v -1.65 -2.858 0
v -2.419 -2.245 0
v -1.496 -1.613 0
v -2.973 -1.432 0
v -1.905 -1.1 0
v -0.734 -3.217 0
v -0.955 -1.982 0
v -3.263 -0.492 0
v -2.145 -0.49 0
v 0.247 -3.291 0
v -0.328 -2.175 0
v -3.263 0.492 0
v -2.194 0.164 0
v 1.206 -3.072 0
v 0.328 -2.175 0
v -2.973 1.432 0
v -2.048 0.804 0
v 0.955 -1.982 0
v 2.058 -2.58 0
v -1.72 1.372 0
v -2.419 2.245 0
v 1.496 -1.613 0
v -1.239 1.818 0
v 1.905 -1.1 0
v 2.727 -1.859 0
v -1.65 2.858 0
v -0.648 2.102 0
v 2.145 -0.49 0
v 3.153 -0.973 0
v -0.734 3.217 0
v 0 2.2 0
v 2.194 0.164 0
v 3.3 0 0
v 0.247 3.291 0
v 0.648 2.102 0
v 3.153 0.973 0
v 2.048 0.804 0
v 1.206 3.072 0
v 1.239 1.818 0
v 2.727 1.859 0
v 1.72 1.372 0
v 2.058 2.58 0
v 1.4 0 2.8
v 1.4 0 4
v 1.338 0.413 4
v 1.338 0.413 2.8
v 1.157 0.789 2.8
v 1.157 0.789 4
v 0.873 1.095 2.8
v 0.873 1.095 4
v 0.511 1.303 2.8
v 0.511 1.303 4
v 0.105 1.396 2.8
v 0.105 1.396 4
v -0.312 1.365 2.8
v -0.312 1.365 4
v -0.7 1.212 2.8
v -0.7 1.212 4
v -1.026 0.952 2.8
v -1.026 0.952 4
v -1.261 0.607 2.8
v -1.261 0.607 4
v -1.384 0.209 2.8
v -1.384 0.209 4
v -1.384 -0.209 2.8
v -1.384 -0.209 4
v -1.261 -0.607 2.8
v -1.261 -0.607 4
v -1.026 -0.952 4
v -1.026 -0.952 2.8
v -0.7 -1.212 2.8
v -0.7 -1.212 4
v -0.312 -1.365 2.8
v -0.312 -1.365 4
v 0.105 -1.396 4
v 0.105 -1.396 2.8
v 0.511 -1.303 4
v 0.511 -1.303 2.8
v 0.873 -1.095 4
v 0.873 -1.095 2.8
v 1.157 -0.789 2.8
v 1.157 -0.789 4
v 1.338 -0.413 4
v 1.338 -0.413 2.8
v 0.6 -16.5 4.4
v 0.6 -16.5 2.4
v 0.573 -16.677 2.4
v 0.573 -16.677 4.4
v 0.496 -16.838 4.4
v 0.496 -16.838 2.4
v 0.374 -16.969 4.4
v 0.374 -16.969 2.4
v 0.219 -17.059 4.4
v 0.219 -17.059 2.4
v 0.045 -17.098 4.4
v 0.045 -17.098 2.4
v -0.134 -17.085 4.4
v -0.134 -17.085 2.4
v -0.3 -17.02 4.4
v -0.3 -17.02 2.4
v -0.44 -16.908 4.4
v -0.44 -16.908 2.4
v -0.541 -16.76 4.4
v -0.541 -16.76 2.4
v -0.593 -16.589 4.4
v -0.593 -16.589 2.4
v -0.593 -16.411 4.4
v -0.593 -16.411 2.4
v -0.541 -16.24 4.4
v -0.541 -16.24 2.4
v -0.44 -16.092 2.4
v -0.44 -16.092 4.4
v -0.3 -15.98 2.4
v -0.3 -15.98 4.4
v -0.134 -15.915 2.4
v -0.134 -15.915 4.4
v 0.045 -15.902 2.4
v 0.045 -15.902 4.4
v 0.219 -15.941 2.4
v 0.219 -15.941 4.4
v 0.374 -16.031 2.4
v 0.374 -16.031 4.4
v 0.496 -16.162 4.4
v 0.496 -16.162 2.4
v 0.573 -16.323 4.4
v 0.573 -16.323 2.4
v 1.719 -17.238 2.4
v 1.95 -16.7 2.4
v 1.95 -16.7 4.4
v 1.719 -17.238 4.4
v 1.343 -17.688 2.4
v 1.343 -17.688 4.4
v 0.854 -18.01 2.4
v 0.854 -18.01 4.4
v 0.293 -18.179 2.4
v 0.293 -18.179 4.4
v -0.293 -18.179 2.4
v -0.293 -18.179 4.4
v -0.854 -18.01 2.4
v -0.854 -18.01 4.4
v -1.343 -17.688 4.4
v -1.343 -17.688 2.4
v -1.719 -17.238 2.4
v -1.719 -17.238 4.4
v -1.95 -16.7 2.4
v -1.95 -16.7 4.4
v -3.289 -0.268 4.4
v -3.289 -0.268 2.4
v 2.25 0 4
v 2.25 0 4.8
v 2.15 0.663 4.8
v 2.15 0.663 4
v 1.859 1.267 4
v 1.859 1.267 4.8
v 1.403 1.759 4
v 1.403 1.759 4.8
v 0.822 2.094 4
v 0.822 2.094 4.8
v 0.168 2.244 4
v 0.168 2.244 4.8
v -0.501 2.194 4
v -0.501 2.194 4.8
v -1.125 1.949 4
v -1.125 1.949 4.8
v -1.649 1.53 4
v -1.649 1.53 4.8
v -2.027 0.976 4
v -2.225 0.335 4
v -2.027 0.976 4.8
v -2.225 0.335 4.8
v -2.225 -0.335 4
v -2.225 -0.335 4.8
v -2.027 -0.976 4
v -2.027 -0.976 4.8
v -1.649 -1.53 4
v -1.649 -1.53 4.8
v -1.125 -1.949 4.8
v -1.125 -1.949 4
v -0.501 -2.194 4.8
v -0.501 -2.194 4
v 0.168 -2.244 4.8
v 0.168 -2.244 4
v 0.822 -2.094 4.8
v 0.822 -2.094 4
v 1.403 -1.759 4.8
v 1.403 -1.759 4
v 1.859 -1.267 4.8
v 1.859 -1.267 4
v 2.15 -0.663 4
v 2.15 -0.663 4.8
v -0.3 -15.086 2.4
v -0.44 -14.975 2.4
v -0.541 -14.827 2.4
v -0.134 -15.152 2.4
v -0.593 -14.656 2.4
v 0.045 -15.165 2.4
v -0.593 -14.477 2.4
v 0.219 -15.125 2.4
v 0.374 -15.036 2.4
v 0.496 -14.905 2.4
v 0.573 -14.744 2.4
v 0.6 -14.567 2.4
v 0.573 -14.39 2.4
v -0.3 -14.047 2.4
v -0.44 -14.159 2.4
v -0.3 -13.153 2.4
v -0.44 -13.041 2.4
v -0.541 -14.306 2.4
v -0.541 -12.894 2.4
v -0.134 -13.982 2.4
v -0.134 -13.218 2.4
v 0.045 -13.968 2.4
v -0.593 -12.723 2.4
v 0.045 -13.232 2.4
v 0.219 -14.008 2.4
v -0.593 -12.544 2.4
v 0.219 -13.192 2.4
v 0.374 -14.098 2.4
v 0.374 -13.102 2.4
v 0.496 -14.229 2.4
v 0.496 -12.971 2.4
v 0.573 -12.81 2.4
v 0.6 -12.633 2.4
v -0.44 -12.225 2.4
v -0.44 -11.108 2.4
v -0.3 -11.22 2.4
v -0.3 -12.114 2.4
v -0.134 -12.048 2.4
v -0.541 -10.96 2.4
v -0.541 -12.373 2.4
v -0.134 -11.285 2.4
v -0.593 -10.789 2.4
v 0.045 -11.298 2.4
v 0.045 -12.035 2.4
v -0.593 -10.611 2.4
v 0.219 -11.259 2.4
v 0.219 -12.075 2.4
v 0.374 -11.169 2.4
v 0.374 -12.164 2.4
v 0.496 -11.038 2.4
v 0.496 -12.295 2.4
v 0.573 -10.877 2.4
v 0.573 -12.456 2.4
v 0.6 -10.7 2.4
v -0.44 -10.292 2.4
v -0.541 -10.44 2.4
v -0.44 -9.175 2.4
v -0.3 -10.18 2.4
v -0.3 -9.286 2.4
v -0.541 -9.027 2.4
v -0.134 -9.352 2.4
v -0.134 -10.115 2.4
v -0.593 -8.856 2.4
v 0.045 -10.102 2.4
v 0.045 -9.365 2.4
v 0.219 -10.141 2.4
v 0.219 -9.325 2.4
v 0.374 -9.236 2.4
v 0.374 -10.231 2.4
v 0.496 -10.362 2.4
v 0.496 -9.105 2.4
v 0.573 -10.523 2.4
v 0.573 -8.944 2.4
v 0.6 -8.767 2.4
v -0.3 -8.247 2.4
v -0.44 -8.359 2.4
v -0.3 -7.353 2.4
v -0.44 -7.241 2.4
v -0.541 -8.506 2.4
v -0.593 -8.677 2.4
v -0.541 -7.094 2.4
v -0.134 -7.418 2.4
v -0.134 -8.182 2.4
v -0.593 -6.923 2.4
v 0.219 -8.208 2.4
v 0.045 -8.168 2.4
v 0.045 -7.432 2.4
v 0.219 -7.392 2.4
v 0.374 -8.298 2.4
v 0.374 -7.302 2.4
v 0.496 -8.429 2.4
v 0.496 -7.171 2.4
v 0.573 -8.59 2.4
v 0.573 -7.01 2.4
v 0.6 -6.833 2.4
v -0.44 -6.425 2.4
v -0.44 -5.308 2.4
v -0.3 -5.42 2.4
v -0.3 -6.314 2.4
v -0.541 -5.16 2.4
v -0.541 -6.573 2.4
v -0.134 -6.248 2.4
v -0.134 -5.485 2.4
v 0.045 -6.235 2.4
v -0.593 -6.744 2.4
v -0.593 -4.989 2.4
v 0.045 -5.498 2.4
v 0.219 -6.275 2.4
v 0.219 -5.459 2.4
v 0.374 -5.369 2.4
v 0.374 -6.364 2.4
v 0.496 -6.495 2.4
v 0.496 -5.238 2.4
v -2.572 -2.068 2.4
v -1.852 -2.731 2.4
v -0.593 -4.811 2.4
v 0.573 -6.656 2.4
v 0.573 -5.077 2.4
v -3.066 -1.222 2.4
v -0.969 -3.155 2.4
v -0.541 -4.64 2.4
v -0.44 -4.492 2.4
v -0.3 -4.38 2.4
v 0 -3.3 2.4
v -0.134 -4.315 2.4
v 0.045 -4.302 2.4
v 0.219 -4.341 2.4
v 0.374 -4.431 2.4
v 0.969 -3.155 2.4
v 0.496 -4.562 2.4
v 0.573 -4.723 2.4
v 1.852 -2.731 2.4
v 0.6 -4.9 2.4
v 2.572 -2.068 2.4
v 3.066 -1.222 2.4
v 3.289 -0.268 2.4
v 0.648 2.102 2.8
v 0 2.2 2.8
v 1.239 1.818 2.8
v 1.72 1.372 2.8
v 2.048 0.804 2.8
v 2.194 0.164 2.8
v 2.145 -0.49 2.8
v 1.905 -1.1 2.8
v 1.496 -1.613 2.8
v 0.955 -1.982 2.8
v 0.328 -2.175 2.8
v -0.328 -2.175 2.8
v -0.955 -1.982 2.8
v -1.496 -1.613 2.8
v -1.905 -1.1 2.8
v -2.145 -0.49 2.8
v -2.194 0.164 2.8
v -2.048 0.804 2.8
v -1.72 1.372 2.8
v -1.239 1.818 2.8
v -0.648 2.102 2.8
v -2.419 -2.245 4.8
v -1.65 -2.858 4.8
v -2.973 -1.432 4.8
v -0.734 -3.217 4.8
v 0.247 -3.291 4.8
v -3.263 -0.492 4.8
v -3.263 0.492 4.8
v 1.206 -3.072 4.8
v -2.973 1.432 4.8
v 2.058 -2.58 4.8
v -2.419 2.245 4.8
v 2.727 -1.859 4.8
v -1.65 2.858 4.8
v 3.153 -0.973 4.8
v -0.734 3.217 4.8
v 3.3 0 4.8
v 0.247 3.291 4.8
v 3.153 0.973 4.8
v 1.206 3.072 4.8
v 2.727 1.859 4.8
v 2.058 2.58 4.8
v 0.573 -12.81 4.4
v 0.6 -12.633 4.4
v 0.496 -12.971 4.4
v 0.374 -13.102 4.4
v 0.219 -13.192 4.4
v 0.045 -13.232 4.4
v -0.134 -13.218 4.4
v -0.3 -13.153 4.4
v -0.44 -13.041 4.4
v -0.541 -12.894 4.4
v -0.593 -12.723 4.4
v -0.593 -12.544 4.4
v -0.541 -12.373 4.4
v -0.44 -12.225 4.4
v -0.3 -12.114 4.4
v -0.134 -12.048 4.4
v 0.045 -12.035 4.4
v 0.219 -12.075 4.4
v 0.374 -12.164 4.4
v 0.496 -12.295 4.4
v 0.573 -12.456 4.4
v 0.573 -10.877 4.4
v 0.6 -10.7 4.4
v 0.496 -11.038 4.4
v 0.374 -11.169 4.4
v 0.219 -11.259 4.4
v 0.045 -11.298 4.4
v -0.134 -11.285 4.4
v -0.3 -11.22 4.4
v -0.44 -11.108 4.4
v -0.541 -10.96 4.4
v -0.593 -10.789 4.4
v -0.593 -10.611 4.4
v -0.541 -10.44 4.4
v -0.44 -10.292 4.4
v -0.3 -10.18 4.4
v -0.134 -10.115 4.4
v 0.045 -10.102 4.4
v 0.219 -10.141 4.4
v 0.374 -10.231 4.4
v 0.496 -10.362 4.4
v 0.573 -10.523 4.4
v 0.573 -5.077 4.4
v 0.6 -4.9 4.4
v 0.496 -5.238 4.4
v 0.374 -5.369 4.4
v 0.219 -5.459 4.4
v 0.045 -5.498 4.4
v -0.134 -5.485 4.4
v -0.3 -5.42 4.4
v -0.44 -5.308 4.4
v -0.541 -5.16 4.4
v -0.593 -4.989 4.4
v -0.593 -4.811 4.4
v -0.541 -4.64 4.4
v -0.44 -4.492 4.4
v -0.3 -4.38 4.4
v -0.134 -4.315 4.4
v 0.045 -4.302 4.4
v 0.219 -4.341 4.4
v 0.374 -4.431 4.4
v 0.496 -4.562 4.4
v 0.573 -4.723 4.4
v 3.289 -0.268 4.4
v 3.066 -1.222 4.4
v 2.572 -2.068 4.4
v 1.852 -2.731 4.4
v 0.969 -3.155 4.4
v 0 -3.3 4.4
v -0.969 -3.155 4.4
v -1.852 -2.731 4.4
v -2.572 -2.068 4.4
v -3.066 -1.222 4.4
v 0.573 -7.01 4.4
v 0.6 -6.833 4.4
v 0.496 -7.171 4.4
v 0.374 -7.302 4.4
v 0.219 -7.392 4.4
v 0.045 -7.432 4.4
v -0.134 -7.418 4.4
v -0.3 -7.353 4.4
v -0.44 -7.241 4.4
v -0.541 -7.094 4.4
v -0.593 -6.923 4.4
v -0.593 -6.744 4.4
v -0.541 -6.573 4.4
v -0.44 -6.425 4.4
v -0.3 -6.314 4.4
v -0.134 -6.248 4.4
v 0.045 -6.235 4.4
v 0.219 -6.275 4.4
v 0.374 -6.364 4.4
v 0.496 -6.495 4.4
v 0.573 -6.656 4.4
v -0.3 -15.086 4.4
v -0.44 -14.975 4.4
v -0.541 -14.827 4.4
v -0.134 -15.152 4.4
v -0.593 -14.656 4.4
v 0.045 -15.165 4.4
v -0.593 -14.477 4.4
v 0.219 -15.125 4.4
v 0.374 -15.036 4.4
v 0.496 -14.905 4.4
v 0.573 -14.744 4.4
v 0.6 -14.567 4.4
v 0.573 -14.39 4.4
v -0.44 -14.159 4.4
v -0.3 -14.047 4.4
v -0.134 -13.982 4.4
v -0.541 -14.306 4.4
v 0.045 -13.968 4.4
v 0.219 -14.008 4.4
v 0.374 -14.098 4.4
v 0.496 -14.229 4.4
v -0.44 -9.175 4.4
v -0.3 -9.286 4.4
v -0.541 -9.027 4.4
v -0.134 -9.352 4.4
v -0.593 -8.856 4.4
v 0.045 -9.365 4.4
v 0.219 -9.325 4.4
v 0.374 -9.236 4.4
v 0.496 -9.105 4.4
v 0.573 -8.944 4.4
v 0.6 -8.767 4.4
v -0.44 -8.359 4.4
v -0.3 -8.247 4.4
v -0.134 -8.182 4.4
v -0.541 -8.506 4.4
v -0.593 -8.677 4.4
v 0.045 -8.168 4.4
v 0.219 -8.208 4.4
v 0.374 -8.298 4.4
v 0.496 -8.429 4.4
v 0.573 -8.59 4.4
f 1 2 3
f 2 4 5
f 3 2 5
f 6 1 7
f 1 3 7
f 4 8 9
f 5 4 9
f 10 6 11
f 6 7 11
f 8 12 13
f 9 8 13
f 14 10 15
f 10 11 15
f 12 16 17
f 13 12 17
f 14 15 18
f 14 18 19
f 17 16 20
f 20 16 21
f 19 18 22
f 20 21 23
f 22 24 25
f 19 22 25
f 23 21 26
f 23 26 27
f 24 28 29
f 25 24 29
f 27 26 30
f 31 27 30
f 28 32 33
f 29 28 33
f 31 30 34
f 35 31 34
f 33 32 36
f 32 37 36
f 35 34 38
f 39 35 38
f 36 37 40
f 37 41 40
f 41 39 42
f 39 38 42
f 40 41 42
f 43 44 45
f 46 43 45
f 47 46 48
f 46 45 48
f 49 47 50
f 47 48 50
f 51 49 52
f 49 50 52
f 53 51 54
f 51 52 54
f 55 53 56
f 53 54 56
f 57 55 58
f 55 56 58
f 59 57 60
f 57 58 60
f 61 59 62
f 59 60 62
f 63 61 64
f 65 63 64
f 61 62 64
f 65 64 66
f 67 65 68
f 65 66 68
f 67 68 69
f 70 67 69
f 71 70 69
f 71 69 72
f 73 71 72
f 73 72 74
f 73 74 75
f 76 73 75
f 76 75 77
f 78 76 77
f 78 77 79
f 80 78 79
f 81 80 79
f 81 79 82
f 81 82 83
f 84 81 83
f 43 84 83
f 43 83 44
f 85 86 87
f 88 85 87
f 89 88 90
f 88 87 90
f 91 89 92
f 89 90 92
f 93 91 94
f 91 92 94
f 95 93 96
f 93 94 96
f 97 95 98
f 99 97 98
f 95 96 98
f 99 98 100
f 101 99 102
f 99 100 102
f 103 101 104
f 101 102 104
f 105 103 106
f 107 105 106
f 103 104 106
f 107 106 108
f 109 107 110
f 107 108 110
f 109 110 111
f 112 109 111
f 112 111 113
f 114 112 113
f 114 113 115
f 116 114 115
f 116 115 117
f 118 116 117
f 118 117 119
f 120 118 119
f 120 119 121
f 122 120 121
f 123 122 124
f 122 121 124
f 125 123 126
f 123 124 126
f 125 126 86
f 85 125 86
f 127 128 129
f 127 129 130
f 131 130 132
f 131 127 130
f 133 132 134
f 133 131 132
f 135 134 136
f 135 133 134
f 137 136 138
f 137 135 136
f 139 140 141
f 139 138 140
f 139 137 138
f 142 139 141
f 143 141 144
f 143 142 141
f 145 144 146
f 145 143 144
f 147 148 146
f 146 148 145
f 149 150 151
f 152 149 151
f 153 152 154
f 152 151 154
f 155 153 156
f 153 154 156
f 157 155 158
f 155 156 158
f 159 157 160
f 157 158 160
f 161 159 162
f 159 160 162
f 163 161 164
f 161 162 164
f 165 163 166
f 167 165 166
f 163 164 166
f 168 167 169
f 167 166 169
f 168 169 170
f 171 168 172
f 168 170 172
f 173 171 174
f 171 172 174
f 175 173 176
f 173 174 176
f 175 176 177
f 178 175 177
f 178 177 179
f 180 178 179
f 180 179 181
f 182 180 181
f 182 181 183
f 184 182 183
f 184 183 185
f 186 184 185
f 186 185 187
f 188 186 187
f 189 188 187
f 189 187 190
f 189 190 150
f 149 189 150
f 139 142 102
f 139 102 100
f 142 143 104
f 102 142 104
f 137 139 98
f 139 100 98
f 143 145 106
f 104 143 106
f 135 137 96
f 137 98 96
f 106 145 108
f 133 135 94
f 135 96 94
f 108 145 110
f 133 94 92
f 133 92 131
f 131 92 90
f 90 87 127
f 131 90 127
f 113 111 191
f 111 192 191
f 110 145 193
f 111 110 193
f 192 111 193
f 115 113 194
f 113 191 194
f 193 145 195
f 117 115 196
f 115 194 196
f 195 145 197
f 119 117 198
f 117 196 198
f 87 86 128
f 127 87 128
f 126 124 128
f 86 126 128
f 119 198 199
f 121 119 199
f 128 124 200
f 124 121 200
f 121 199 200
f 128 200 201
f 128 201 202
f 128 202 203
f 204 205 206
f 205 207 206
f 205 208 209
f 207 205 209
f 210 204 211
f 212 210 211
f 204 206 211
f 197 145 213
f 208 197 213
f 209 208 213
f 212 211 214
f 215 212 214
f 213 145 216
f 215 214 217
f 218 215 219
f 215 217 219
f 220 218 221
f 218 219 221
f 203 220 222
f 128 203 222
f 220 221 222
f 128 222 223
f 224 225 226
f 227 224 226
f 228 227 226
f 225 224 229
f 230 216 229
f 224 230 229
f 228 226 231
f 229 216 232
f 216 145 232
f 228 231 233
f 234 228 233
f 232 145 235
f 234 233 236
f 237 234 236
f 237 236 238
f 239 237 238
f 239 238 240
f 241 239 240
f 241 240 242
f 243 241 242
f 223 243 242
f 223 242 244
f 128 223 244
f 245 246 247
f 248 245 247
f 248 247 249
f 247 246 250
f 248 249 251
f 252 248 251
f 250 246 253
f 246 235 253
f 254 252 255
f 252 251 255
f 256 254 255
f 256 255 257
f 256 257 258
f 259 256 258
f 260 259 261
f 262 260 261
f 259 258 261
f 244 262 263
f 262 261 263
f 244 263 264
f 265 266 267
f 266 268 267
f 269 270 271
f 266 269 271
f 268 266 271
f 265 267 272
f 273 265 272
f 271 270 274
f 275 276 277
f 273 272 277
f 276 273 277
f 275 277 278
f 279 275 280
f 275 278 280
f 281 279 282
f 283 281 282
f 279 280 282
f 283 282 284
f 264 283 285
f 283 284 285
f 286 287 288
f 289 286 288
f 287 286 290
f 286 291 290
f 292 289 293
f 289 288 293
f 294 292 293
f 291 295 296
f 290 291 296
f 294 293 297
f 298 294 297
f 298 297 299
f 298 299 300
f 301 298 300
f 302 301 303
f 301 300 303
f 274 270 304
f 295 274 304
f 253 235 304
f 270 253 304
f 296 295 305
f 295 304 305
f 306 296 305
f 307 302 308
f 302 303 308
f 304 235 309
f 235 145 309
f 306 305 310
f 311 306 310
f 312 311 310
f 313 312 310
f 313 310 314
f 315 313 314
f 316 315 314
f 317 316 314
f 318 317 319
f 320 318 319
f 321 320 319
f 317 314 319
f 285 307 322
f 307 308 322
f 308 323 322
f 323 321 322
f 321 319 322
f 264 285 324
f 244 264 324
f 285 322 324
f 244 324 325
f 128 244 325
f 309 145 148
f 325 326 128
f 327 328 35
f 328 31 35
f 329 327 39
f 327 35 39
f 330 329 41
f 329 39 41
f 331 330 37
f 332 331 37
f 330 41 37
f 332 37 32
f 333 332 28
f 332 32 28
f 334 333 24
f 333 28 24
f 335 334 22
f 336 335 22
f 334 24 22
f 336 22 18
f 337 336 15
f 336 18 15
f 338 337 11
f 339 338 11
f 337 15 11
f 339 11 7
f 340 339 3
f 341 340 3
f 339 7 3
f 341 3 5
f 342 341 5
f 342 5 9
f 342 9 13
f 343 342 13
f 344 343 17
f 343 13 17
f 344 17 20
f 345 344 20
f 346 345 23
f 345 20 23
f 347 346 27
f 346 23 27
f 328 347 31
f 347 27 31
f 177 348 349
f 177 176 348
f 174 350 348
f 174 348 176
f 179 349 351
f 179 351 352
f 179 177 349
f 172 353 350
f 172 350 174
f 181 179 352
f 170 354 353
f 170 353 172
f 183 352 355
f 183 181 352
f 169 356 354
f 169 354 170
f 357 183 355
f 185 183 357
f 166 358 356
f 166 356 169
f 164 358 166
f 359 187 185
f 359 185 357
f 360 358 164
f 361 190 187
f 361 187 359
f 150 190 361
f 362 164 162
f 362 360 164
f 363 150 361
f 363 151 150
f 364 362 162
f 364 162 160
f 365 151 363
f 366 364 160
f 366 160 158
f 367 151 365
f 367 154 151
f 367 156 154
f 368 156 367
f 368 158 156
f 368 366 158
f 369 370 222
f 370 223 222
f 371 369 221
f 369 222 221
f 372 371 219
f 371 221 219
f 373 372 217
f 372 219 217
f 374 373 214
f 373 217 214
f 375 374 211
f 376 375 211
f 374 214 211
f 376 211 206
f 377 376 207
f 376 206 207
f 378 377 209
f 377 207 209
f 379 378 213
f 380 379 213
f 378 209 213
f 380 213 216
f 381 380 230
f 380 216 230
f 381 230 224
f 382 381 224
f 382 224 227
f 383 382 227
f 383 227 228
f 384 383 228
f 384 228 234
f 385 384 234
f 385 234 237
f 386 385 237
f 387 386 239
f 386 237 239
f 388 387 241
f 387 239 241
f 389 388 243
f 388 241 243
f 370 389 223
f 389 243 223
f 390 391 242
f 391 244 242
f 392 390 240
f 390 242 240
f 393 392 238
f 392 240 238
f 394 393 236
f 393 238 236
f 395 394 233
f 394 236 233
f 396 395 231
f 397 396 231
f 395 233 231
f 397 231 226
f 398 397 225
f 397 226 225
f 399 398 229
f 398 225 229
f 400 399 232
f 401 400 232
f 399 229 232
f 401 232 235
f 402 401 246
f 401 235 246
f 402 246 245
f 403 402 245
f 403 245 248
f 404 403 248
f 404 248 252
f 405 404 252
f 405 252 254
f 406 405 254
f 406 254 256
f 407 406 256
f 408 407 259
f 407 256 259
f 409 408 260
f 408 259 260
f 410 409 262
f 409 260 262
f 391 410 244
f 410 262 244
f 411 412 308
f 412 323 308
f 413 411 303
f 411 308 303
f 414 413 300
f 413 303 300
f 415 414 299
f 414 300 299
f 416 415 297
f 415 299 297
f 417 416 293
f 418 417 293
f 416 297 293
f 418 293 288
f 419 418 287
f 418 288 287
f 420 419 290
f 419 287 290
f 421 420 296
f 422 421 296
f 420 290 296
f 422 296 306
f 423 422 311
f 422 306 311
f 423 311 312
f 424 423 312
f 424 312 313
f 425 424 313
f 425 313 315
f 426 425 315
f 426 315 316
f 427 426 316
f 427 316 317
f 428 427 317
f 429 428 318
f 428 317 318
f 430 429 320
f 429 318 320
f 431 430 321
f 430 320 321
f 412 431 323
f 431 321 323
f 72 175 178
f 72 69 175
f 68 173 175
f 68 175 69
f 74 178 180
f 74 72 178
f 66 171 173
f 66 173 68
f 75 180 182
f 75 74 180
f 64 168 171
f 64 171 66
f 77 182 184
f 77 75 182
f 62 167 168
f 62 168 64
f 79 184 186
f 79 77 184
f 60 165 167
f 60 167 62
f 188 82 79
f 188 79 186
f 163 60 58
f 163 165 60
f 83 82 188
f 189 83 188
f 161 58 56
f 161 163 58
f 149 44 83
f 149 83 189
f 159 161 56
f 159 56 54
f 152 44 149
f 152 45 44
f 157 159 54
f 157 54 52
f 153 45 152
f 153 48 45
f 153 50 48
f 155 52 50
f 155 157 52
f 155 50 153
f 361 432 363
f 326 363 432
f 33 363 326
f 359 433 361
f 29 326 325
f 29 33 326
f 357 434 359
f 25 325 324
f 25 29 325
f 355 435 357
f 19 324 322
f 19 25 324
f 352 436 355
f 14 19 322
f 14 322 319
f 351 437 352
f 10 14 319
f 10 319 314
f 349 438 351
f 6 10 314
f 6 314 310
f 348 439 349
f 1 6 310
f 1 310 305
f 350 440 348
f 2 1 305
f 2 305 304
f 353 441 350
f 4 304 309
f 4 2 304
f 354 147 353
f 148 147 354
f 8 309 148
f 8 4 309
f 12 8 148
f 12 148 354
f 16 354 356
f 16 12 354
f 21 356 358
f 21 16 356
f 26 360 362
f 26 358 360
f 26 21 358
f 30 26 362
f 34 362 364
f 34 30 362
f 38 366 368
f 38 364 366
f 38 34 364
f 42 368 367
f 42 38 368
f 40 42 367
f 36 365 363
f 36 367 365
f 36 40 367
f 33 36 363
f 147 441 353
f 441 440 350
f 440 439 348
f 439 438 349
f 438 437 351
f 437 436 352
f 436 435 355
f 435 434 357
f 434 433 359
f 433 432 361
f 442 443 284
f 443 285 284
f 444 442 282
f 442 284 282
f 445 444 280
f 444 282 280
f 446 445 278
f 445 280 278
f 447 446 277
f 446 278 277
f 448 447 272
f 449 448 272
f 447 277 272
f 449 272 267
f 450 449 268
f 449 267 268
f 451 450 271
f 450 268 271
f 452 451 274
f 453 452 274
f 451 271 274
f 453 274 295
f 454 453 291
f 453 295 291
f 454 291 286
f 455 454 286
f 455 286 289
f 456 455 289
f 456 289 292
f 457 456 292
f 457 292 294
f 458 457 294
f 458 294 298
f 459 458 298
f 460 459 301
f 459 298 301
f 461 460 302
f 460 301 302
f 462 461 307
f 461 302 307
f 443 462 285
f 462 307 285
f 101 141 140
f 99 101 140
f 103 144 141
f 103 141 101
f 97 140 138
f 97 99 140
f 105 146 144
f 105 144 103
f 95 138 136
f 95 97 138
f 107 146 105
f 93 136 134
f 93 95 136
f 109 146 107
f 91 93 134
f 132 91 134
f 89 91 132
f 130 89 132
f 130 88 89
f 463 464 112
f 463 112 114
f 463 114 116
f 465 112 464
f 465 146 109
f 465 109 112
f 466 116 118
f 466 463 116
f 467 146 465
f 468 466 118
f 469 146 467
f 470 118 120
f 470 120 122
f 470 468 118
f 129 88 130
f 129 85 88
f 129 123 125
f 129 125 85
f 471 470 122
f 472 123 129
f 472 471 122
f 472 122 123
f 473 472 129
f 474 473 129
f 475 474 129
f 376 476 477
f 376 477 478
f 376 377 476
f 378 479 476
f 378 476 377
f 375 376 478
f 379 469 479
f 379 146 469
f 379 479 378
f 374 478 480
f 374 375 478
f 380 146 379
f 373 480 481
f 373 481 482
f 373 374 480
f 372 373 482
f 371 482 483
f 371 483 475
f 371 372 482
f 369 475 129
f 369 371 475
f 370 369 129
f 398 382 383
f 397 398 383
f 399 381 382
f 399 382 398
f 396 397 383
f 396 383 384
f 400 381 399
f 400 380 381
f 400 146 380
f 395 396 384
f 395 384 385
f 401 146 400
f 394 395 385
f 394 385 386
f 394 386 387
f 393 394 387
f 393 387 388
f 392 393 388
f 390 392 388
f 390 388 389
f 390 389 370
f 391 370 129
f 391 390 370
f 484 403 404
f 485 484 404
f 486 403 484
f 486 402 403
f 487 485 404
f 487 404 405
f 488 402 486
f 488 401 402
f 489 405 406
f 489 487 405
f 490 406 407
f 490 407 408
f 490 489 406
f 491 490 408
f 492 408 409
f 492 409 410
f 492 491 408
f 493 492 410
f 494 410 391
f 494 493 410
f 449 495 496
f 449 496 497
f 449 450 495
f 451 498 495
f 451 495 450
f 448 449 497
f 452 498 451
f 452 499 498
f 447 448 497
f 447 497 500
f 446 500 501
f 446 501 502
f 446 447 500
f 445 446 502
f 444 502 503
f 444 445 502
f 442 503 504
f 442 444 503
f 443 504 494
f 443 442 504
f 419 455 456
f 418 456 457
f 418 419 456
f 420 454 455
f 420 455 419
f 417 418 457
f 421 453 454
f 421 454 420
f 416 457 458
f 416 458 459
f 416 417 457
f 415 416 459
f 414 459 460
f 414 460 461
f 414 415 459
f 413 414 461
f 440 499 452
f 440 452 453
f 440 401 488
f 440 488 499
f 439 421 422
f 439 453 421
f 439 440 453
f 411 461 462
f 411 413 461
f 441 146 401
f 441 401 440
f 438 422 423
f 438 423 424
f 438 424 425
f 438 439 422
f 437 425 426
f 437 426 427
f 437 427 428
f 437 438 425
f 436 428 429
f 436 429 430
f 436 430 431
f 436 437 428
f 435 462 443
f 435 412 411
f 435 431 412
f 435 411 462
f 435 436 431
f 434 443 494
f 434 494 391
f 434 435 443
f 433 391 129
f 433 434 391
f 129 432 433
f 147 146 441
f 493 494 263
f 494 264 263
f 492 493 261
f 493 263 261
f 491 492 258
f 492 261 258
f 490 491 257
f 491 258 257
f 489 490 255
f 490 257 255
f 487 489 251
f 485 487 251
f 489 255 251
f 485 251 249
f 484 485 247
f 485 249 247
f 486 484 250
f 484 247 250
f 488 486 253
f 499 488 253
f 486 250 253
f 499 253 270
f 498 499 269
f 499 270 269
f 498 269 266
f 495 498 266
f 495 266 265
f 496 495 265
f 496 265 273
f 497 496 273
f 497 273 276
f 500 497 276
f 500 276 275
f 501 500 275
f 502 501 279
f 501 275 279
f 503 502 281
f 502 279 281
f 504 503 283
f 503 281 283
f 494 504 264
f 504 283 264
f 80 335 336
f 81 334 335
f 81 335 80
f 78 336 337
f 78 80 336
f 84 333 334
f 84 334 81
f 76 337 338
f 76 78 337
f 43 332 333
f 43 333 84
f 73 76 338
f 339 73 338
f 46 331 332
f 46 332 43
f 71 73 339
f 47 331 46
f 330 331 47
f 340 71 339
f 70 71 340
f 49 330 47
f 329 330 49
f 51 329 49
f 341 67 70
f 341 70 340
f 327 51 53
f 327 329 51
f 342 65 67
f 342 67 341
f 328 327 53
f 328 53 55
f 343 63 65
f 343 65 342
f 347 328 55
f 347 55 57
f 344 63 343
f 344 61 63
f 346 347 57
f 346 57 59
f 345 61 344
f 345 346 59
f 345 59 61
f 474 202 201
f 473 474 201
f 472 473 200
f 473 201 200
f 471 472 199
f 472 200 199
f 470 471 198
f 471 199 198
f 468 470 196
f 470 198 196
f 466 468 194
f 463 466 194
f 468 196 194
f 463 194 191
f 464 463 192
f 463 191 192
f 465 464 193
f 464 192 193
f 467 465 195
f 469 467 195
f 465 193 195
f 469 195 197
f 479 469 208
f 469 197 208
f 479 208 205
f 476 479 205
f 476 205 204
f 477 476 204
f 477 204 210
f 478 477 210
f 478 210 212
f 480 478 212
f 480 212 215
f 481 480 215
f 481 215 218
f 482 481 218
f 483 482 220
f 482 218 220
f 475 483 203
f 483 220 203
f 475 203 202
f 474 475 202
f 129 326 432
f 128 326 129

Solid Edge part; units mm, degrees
sketch "Sketch1" plane through (0, 0, 0) normal (0, 0, 1) x (1, 0, 0)
  circle A0 centre (0, 0) radius 3.3
  dimension "D1" = 6.6
extrude "Protrusion1" add sketch "Sketch1" along normal blind 4.8
sketch "Sketch2" plane through (0, 0, 4.8) normal (0, 0, 1) x (1, 0, 0)
  circle A0 centre (0, 0) radius 2.25
  dimension "D1" = 4.5
extrude "nail_base" cut sketch "Sketch2" against normal blind 0.8
sketch "Sketch3" plane through (0, 0, 4) normal (0, 0, 1) x (1, 0, 0)
  circle A0 centre (0, 0) radius 1.4
  dimension "D1" = 2.8
extrude "Cutout1" cut sketch "Sketch3" against normal through all
sketch "Sketch4" plane through (0, 0, 0) normal (0, 0, -1) x (0, 1, 0)
  circle A0 centre (0, 0) radius 2.2
extrude "servo_mounting" cut sketch "Sketch4" against normal blind 2.8
sketch "Sketch5" plane through (0, 0, 2.4) normal (0, 0, -1) x (1, 0, 0)
  line L0 (-3.2891, 0.268) -> (-1.95, 16.7)
  arc A0 (-1.95, 16.7) -> (1.95, 16.7) centre (0, 16.1825) cw
  line L1 (3.2891, 0.268) -> (1.95, 16.7)
  arc A1 (-3.2891, 0.268) -> (3.2891, 0.268) centre (0, 0) cw
  dimension "D1" = 21.5
  dimension "D2" = 3.9
  dimension "D3" = 20
extrude "connector" add sketch "Sketch5" against normal blind 2
sketch "Sketch6" plane through (0, 0, 0) normal (0, 0, 1) x (1, 0, 0)
  circle A0 centre (0, -4.9) radius 0.6
  circle A1 centre (0, -6.8333) radius 0.6
  circle A2 centre (0, -8.7667) radius 0.6
  circle A3 centre (0, -10.7) radius 0.6
  circle A4 centre (0, -12.6333) radius 0.6
  circle A5 centre (0, -14.5667) radius 0.6
  circle A6 centre (0, -16.5) radius 0.6
  dimension "D1" = 1.2
  dimension "D2" = 5.8
  dimension "D3" = 18.7
extrude "Cutout2" cut sketch "Sketch6" along normal through all
